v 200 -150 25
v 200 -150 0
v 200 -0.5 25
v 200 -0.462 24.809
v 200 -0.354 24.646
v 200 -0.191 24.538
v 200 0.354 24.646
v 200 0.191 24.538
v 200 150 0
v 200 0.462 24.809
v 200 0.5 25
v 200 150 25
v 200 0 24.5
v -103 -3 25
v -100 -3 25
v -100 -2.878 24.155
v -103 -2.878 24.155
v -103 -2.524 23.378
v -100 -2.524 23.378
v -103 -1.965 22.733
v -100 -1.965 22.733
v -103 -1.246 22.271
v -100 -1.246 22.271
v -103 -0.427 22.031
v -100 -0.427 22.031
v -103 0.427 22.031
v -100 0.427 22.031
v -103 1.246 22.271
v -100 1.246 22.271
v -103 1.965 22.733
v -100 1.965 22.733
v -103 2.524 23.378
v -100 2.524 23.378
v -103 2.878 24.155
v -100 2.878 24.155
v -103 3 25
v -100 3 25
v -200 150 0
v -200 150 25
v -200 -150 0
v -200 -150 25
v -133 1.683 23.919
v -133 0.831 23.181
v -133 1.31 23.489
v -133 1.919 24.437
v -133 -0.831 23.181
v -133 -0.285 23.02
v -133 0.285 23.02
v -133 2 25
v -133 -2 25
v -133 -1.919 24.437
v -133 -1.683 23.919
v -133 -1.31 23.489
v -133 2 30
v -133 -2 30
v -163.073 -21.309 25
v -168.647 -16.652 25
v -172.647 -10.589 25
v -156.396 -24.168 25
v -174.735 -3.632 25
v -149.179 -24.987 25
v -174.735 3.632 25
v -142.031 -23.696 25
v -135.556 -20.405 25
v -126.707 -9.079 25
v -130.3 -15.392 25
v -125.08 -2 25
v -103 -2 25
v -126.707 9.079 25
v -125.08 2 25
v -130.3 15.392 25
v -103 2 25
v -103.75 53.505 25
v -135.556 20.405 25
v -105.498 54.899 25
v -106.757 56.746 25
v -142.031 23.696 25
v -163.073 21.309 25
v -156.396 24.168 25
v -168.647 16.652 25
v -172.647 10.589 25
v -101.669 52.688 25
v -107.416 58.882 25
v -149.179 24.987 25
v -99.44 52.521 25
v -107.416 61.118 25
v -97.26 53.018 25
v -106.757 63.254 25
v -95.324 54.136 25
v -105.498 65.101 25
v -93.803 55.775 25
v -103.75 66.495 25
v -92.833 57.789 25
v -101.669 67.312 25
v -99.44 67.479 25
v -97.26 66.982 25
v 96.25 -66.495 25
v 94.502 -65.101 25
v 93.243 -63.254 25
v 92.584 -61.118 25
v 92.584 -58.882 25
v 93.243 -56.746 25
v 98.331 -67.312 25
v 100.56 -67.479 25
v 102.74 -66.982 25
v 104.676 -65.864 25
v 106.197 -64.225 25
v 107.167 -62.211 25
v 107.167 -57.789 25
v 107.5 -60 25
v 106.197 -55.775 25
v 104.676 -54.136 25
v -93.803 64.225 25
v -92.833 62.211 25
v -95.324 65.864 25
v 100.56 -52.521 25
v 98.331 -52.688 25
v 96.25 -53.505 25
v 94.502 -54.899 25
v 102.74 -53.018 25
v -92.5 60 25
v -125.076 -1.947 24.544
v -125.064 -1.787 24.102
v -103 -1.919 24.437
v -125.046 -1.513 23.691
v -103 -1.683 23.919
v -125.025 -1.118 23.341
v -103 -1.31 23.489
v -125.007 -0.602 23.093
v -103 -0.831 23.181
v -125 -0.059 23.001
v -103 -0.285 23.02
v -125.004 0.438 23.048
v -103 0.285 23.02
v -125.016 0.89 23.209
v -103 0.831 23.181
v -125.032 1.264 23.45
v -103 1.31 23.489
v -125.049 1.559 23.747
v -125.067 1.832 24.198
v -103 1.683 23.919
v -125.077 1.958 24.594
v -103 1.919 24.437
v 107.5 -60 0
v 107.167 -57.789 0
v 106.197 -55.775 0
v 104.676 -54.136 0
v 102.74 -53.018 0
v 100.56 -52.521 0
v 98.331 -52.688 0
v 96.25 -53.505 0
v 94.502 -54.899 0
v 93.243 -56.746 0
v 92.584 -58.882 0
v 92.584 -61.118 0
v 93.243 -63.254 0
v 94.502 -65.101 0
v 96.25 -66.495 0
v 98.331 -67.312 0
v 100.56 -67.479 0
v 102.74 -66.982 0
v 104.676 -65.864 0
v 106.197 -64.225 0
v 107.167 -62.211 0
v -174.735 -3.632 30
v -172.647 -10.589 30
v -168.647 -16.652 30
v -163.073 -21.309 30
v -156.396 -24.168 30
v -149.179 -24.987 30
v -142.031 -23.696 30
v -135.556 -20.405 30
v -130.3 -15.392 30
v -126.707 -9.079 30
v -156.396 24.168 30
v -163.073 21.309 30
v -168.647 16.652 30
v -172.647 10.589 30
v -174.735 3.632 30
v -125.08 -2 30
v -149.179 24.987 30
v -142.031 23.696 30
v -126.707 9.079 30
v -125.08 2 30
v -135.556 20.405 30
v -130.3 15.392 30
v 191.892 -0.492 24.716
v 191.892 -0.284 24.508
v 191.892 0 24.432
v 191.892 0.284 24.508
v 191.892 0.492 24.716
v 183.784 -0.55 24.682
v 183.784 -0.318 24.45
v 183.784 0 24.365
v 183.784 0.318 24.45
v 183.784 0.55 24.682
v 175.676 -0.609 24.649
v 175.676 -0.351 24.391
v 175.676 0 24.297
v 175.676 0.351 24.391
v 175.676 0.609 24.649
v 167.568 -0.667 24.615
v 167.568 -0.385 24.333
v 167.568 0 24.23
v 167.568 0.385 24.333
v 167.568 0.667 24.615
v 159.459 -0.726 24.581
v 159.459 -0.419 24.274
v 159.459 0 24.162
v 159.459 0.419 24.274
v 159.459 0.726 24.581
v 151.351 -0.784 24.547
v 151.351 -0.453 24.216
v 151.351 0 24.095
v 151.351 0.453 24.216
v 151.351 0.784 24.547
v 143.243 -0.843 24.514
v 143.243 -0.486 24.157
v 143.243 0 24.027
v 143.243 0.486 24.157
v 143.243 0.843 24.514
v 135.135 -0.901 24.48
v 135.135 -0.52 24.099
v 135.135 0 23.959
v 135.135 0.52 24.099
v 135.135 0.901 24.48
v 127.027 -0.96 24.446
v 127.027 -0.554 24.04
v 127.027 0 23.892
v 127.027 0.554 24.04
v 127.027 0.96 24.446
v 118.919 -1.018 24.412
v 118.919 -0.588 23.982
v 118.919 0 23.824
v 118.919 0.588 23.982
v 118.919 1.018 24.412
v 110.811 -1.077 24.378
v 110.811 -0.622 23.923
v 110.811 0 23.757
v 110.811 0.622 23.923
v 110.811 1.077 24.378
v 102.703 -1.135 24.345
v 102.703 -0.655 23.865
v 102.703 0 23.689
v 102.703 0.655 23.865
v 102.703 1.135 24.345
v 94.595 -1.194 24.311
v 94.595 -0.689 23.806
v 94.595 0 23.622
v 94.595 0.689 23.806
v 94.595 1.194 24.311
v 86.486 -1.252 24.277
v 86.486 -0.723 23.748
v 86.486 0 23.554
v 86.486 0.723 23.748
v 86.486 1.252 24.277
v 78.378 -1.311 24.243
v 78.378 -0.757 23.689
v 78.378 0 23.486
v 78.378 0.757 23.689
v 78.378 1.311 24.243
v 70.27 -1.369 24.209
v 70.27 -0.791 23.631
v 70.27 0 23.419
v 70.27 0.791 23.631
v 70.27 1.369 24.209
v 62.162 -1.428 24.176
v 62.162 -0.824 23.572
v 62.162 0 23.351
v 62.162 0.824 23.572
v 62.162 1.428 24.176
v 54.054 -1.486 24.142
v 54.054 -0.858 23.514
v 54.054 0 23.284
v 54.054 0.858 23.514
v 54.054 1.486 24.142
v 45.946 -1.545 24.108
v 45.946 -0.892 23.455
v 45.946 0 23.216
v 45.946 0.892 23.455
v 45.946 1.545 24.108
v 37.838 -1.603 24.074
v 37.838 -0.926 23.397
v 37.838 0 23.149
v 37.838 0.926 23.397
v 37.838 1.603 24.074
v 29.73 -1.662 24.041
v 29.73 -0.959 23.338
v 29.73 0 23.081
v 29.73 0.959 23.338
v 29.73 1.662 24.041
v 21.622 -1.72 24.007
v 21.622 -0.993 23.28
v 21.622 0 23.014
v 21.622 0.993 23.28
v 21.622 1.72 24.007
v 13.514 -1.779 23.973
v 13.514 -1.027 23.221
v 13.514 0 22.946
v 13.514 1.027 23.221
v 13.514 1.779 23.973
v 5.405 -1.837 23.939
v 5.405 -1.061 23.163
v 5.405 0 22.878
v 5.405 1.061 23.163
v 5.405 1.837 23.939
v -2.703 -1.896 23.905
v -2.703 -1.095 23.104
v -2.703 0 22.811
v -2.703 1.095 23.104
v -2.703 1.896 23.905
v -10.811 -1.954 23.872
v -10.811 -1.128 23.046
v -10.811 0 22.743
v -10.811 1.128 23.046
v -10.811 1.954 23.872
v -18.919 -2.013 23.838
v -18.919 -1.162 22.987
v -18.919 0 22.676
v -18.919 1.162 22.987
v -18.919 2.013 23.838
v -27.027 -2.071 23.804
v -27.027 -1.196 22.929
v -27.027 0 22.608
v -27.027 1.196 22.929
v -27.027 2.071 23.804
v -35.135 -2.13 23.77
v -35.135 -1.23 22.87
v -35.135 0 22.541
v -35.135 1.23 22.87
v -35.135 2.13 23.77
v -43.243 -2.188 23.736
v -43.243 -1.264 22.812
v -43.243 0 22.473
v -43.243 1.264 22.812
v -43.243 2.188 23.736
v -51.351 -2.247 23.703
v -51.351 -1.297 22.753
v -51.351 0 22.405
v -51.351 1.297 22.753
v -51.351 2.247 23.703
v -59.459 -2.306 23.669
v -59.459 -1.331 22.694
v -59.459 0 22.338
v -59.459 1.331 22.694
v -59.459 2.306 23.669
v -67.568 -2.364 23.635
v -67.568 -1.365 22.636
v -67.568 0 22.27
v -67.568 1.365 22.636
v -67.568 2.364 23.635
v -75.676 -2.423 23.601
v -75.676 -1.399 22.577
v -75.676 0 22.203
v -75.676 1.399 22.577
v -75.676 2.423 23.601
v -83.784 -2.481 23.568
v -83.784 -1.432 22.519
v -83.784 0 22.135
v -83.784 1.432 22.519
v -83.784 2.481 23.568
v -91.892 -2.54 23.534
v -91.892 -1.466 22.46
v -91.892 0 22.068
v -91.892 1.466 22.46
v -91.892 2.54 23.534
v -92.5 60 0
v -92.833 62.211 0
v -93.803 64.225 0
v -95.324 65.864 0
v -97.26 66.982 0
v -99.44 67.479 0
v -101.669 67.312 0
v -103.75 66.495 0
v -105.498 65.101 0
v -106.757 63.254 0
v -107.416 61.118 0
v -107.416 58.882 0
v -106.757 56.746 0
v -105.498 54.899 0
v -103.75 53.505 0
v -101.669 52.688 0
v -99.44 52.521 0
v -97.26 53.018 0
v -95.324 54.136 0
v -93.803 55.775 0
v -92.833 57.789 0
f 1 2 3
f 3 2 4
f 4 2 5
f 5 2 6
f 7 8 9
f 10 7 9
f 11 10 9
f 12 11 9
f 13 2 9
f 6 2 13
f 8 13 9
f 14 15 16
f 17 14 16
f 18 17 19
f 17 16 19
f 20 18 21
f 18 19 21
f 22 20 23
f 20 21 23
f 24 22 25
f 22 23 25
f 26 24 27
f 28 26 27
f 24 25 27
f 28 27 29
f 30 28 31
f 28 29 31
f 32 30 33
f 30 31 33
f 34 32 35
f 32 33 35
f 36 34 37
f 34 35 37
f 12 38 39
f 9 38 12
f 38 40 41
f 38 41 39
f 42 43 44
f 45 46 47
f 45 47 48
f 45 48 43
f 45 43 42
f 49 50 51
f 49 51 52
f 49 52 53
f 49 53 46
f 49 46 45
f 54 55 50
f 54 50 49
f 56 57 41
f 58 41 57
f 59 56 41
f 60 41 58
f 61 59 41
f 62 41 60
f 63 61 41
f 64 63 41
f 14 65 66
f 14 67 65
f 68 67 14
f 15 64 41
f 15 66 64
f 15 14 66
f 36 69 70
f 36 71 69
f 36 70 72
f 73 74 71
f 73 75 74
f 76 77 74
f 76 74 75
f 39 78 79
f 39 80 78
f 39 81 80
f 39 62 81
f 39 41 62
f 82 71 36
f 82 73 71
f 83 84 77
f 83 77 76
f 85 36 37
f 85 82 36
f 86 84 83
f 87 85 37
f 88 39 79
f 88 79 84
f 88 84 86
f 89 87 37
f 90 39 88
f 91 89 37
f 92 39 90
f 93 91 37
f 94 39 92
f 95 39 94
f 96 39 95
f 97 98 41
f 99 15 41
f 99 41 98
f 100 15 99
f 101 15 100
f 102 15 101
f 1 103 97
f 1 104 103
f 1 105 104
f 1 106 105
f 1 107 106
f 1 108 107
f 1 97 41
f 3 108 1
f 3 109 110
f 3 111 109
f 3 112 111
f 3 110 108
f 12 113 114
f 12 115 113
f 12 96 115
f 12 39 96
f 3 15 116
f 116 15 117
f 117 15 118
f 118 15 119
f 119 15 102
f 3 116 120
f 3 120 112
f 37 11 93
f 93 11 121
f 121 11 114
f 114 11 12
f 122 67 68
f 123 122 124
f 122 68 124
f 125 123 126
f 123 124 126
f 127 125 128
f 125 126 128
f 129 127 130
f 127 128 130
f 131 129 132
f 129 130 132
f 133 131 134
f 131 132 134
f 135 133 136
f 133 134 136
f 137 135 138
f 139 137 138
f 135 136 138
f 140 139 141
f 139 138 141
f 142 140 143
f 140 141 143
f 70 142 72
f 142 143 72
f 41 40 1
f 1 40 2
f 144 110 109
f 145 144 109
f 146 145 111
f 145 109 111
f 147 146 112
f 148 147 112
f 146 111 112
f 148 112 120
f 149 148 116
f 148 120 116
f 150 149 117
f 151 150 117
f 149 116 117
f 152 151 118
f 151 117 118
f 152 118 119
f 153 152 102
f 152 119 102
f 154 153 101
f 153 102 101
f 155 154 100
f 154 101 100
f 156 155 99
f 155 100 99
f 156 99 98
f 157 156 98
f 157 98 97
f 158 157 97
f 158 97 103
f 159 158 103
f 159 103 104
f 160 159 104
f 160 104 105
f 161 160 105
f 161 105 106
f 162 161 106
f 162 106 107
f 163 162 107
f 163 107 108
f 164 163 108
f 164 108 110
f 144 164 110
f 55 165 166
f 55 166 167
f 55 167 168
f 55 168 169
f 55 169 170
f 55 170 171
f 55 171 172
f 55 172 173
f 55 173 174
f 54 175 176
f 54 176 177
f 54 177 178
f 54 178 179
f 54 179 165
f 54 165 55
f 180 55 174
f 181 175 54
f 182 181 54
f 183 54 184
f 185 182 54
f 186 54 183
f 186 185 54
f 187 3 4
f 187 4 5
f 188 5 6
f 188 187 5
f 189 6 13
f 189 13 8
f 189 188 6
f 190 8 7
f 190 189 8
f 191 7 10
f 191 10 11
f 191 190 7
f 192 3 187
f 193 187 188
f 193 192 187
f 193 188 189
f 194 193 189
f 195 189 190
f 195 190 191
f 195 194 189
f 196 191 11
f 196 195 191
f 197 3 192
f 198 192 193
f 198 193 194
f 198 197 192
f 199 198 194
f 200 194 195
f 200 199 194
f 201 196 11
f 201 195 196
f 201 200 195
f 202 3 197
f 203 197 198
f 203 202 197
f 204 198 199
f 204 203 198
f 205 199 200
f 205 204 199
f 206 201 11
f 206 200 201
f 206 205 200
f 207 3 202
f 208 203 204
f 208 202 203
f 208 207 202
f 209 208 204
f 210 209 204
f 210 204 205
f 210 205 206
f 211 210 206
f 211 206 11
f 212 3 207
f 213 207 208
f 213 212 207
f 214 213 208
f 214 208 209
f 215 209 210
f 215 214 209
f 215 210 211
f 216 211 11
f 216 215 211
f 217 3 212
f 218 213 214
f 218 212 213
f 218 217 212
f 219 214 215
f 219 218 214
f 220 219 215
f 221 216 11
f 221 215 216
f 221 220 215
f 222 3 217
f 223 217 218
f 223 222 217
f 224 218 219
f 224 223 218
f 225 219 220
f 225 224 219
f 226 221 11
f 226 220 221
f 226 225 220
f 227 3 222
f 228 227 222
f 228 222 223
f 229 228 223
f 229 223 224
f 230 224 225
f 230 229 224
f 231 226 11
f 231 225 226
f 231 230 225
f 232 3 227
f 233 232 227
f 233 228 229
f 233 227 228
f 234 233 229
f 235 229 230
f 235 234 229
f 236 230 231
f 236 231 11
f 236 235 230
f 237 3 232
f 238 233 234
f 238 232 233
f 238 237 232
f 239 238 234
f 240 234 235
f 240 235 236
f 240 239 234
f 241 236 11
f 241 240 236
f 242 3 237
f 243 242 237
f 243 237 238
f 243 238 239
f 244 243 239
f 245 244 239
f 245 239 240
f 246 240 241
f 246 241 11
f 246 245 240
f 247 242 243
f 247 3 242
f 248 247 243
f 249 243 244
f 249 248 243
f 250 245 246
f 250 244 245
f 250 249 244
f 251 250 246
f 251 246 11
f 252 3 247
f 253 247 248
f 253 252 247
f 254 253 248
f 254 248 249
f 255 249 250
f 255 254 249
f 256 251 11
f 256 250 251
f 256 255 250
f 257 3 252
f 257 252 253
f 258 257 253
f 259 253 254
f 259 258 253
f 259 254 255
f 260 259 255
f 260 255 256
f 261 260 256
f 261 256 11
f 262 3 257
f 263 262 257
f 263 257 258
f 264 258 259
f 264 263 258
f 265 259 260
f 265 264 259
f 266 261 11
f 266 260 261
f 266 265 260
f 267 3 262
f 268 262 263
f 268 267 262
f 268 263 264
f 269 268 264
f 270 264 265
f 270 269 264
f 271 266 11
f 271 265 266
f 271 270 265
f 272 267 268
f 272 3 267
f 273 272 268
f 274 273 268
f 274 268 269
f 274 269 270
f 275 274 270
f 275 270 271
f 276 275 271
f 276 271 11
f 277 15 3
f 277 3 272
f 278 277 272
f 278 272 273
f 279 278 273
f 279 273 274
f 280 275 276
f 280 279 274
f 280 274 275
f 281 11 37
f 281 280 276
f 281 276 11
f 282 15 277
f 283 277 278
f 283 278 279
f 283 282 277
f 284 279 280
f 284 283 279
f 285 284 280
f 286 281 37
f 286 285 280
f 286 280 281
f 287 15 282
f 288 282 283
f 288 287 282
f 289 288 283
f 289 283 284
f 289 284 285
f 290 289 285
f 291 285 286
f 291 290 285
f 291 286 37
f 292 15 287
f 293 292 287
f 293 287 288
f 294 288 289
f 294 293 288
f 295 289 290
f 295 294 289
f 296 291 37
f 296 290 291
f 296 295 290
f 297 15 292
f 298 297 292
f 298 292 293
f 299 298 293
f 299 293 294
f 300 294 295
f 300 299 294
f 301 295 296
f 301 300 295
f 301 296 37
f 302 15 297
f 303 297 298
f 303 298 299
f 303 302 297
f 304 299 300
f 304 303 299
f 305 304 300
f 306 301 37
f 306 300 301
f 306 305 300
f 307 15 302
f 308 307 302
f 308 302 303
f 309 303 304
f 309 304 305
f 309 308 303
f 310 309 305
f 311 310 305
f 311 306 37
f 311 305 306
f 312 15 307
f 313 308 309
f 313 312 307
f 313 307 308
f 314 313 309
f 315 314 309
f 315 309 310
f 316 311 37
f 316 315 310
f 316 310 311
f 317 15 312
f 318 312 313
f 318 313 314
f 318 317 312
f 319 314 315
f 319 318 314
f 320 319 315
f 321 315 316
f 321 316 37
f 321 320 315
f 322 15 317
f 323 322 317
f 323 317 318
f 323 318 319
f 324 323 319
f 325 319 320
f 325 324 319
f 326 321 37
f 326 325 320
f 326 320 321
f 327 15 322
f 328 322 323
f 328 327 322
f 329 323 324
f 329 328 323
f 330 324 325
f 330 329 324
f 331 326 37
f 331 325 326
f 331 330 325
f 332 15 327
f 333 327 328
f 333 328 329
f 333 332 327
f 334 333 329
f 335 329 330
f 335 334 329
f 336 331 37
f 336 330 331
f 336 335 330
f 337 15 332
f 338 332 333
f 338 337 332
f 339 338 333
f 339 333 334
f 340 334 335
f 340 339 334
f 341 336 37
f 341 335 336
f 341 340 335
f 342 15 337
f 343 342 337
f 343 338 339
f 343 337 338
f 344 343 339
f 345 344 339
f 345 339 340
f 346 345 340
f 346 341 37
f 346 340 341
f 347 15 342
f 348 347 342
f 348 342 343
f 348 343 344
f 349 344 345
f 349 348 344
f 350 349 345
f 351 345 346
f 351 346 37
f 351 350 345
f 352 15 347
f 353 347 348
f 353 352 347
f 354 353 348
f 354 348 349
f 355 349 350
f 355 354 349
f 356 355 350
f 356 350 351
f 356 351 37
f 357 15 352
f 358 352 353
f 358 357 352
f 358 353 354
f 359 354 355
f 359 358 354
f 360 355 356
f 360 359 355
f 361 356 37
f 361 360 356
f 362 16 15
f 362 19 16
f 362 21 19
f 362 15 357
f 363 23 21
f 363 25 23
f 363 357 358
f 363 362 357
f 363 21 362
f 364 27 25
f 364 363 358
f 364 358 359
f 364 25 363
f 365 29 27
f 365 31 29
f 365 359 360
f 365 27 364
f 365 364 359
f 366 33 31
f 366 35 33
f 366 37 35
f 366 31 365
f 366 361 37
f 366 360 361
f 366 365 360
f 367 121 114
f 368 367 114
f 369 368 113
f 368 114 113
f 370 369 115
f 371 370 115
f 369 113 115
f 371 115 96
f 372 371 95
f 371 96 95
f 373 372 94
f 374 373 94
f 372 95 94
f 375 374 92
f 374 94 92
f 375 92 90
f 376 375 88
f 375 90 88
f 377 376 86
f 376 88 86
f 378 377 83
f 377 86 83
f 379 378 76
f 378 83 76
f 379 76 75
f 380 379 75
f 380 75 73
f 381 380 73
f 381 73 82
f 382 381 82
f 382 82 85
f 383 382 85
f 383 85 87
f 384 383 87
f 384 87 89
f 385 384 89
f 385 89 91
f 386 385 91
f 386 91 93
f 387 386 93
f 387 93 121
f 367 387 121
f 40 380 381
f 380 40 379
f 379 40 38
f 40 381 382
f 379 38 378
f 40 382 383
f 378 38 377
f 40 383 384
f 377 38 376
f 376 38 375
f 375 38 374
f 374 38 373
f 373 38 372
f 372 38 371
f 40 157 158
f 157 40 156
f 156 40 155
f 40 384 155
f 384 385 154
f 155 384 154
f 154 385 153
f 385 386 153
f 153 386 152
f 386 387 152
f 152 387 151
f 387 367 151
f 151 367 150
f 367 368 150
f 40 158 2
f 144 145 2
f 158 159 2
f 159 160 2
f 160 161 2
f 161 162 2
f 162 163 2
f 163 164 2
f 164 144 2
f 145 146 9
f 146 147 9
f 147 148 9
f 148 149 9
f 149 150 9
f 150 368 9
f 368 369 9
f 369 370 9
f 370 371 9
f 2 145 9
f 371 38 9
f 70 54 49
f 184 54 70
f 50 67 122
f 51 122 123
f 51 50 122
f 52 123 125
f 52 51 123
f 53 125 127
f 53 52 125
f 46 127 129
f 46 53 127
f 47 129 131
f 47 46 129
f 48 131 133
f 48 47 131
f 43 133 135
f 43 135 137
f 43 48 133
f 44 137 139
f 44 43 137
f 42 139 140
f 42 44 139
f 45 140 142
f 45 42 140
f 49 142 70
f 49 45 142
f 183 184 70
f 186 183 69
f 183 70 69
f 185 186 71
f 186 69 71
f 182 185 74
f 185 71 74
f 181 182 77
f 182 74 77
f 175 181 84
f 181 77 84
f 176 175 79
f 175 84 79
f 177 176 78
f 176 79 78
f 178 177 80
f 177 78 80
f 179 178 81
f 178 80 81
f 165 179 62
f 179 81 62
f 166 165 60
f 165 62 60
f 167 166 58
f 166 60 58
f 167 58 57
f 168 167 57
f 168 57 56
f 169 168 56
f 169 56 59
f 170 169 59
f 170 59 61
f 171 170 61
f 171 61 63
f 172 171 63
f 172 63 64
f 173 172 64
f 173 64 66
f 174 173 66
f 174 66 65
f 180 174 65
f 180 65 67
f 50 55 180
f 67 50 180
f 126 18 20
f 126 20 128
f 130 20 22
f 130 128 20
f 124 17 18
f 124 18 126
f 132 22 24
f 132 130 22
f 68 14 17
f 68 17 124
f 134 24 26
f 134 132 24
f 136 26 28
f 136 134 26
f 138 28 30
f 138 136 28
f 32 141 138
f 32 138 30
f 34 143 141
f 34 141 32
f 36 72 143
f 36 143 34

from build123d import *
from build123d import SkipClean  # not in build123d's __all__

# Parameters (mm, degrees)
F0_W          = 400
F0_H          = 300
F1_DEPTH      = 25
F4_R          = 25
F5_DEPTH      = 5
F6_R          = 3
F7_DEPTH      = 3
F9_END_RADIUS = 25
F8_R          = 2
F9_REACH      = 102.6578543495
F10_W         = 11.0047593287
F10_H         = 4
F11_DEPTH     = 5
F14_R         = 7.5
F15_DEPTH     = 25.001


with BuildPart() as f1:
    # F0 (on Top) → F1 (new body)
    with BuildSketch(Plane.XY):
        Rectangle(F0_W, F0_H)
    extrude(amount=F1_DEPTH)

    # F2 (on face) → F3 (revolve, cut)
    with BuildSketch(Plane.XY.offset(25)):
        Polygon((200, 0), (200, 0.5), (-100, 3), (-100, 0), align=None)
    revolve(axis=Axis((50, 0, 25), (1, 0, 0)), mode=Mode.SUBTRACT)

    # F4 (on face) → F5 (join)
    with BuildSketch(Plane.XY.offset(25)):
        with Locations((-150, 0)):
            Circle(F4_R)
    extrude(amount=F5_DEPTH)

    # F6 (on face) → F7 (cut)
    with BuildSketch(Plane.YZ.offset(-100)):
        with Locations((0, 25)):
            Circle(F6_R)
    extrude(amount=-F7_DEPTH, mode=Mode.SUBTRACT)

    f9_end = (Plane(origin=(-150, 0, 27.5), x_dir=(-1, 0, 0), z_dir=(0, 0, -1)) * Cylinder(F9_END_RADIUS, 1207.1140921674, mode=Mode.PRIVATE)).faces().sort_by_distance((-175, 0, 27.5))[0]
    # F8 (on face) → F9 (cut, up to the whole of a round face its end follows)
    with BuildSketch(Plane.YZ.offset(-103)):
        with Locations((0, 25)):
            Circle(F8_R)
    f9_long = extrude(amount=-F9_REACH, mode=Mode.PRIVATE)
    add(split(f9_long, bisect_by=f9_end, keep=Keep.ALL, mode=Mode.PRIVATE).solids().sort_by_distance((-103, 0, 25))[0], mode=Mode.SUBTRACT)

    # F10 (on face) → F11 (cut)
    with BuildSketch(Plane.XY.offset(30)):
        with Locations((-127.4976203357, 0)):
            Rectangle(F10_W, F10_H)
    extrude(amount=-F11_DEPTH, mode=Mode.SUBTRACT)

    # F12 (on face) → F13 (revolve, cut)
    with BuildSketch(Plane.XY.offset(25)):
        with BuildLine():
            Line((-133, 2), (-133, 0))
            Line((-133, 0), (-125, 0))
            ThreePointArc((-125, 0), (-125.020040135, 1.0008022485), (-125.0801284112, 2))
            Line((-125.0801284112, 2), (-133, 2))
        make_face()
        with BuildLine():
            ThreePointArc((-125.0801284112, 2), (-125.020040135, 1.0008022485), (-125, 0))
            Line((-125, 0), (-123.6437782645, 0))
            Line((-123.6437782645, 0), (-123.6437782645, 2))
            Line((-123.6437782645, 2), (-125.0801284112, 2))
        make_face()
    revolve(axis=Axis((-128.3218891323, 0, 25), (1, 0, 0)), mode=Mode.SUBTRACT)

    # F14 (on face) → F15 (cut, through all)
    with BuildSketch(Plane.XY.offset(25)):
        with Locations((100, -60)):
            Circle(F14_R)
        with Locations((-100, 60)):
            Circle(F14_R)
    extrude(amount=-F15_DEPTH, mode=Mode.SUBTRACT)


solid = f1.part
